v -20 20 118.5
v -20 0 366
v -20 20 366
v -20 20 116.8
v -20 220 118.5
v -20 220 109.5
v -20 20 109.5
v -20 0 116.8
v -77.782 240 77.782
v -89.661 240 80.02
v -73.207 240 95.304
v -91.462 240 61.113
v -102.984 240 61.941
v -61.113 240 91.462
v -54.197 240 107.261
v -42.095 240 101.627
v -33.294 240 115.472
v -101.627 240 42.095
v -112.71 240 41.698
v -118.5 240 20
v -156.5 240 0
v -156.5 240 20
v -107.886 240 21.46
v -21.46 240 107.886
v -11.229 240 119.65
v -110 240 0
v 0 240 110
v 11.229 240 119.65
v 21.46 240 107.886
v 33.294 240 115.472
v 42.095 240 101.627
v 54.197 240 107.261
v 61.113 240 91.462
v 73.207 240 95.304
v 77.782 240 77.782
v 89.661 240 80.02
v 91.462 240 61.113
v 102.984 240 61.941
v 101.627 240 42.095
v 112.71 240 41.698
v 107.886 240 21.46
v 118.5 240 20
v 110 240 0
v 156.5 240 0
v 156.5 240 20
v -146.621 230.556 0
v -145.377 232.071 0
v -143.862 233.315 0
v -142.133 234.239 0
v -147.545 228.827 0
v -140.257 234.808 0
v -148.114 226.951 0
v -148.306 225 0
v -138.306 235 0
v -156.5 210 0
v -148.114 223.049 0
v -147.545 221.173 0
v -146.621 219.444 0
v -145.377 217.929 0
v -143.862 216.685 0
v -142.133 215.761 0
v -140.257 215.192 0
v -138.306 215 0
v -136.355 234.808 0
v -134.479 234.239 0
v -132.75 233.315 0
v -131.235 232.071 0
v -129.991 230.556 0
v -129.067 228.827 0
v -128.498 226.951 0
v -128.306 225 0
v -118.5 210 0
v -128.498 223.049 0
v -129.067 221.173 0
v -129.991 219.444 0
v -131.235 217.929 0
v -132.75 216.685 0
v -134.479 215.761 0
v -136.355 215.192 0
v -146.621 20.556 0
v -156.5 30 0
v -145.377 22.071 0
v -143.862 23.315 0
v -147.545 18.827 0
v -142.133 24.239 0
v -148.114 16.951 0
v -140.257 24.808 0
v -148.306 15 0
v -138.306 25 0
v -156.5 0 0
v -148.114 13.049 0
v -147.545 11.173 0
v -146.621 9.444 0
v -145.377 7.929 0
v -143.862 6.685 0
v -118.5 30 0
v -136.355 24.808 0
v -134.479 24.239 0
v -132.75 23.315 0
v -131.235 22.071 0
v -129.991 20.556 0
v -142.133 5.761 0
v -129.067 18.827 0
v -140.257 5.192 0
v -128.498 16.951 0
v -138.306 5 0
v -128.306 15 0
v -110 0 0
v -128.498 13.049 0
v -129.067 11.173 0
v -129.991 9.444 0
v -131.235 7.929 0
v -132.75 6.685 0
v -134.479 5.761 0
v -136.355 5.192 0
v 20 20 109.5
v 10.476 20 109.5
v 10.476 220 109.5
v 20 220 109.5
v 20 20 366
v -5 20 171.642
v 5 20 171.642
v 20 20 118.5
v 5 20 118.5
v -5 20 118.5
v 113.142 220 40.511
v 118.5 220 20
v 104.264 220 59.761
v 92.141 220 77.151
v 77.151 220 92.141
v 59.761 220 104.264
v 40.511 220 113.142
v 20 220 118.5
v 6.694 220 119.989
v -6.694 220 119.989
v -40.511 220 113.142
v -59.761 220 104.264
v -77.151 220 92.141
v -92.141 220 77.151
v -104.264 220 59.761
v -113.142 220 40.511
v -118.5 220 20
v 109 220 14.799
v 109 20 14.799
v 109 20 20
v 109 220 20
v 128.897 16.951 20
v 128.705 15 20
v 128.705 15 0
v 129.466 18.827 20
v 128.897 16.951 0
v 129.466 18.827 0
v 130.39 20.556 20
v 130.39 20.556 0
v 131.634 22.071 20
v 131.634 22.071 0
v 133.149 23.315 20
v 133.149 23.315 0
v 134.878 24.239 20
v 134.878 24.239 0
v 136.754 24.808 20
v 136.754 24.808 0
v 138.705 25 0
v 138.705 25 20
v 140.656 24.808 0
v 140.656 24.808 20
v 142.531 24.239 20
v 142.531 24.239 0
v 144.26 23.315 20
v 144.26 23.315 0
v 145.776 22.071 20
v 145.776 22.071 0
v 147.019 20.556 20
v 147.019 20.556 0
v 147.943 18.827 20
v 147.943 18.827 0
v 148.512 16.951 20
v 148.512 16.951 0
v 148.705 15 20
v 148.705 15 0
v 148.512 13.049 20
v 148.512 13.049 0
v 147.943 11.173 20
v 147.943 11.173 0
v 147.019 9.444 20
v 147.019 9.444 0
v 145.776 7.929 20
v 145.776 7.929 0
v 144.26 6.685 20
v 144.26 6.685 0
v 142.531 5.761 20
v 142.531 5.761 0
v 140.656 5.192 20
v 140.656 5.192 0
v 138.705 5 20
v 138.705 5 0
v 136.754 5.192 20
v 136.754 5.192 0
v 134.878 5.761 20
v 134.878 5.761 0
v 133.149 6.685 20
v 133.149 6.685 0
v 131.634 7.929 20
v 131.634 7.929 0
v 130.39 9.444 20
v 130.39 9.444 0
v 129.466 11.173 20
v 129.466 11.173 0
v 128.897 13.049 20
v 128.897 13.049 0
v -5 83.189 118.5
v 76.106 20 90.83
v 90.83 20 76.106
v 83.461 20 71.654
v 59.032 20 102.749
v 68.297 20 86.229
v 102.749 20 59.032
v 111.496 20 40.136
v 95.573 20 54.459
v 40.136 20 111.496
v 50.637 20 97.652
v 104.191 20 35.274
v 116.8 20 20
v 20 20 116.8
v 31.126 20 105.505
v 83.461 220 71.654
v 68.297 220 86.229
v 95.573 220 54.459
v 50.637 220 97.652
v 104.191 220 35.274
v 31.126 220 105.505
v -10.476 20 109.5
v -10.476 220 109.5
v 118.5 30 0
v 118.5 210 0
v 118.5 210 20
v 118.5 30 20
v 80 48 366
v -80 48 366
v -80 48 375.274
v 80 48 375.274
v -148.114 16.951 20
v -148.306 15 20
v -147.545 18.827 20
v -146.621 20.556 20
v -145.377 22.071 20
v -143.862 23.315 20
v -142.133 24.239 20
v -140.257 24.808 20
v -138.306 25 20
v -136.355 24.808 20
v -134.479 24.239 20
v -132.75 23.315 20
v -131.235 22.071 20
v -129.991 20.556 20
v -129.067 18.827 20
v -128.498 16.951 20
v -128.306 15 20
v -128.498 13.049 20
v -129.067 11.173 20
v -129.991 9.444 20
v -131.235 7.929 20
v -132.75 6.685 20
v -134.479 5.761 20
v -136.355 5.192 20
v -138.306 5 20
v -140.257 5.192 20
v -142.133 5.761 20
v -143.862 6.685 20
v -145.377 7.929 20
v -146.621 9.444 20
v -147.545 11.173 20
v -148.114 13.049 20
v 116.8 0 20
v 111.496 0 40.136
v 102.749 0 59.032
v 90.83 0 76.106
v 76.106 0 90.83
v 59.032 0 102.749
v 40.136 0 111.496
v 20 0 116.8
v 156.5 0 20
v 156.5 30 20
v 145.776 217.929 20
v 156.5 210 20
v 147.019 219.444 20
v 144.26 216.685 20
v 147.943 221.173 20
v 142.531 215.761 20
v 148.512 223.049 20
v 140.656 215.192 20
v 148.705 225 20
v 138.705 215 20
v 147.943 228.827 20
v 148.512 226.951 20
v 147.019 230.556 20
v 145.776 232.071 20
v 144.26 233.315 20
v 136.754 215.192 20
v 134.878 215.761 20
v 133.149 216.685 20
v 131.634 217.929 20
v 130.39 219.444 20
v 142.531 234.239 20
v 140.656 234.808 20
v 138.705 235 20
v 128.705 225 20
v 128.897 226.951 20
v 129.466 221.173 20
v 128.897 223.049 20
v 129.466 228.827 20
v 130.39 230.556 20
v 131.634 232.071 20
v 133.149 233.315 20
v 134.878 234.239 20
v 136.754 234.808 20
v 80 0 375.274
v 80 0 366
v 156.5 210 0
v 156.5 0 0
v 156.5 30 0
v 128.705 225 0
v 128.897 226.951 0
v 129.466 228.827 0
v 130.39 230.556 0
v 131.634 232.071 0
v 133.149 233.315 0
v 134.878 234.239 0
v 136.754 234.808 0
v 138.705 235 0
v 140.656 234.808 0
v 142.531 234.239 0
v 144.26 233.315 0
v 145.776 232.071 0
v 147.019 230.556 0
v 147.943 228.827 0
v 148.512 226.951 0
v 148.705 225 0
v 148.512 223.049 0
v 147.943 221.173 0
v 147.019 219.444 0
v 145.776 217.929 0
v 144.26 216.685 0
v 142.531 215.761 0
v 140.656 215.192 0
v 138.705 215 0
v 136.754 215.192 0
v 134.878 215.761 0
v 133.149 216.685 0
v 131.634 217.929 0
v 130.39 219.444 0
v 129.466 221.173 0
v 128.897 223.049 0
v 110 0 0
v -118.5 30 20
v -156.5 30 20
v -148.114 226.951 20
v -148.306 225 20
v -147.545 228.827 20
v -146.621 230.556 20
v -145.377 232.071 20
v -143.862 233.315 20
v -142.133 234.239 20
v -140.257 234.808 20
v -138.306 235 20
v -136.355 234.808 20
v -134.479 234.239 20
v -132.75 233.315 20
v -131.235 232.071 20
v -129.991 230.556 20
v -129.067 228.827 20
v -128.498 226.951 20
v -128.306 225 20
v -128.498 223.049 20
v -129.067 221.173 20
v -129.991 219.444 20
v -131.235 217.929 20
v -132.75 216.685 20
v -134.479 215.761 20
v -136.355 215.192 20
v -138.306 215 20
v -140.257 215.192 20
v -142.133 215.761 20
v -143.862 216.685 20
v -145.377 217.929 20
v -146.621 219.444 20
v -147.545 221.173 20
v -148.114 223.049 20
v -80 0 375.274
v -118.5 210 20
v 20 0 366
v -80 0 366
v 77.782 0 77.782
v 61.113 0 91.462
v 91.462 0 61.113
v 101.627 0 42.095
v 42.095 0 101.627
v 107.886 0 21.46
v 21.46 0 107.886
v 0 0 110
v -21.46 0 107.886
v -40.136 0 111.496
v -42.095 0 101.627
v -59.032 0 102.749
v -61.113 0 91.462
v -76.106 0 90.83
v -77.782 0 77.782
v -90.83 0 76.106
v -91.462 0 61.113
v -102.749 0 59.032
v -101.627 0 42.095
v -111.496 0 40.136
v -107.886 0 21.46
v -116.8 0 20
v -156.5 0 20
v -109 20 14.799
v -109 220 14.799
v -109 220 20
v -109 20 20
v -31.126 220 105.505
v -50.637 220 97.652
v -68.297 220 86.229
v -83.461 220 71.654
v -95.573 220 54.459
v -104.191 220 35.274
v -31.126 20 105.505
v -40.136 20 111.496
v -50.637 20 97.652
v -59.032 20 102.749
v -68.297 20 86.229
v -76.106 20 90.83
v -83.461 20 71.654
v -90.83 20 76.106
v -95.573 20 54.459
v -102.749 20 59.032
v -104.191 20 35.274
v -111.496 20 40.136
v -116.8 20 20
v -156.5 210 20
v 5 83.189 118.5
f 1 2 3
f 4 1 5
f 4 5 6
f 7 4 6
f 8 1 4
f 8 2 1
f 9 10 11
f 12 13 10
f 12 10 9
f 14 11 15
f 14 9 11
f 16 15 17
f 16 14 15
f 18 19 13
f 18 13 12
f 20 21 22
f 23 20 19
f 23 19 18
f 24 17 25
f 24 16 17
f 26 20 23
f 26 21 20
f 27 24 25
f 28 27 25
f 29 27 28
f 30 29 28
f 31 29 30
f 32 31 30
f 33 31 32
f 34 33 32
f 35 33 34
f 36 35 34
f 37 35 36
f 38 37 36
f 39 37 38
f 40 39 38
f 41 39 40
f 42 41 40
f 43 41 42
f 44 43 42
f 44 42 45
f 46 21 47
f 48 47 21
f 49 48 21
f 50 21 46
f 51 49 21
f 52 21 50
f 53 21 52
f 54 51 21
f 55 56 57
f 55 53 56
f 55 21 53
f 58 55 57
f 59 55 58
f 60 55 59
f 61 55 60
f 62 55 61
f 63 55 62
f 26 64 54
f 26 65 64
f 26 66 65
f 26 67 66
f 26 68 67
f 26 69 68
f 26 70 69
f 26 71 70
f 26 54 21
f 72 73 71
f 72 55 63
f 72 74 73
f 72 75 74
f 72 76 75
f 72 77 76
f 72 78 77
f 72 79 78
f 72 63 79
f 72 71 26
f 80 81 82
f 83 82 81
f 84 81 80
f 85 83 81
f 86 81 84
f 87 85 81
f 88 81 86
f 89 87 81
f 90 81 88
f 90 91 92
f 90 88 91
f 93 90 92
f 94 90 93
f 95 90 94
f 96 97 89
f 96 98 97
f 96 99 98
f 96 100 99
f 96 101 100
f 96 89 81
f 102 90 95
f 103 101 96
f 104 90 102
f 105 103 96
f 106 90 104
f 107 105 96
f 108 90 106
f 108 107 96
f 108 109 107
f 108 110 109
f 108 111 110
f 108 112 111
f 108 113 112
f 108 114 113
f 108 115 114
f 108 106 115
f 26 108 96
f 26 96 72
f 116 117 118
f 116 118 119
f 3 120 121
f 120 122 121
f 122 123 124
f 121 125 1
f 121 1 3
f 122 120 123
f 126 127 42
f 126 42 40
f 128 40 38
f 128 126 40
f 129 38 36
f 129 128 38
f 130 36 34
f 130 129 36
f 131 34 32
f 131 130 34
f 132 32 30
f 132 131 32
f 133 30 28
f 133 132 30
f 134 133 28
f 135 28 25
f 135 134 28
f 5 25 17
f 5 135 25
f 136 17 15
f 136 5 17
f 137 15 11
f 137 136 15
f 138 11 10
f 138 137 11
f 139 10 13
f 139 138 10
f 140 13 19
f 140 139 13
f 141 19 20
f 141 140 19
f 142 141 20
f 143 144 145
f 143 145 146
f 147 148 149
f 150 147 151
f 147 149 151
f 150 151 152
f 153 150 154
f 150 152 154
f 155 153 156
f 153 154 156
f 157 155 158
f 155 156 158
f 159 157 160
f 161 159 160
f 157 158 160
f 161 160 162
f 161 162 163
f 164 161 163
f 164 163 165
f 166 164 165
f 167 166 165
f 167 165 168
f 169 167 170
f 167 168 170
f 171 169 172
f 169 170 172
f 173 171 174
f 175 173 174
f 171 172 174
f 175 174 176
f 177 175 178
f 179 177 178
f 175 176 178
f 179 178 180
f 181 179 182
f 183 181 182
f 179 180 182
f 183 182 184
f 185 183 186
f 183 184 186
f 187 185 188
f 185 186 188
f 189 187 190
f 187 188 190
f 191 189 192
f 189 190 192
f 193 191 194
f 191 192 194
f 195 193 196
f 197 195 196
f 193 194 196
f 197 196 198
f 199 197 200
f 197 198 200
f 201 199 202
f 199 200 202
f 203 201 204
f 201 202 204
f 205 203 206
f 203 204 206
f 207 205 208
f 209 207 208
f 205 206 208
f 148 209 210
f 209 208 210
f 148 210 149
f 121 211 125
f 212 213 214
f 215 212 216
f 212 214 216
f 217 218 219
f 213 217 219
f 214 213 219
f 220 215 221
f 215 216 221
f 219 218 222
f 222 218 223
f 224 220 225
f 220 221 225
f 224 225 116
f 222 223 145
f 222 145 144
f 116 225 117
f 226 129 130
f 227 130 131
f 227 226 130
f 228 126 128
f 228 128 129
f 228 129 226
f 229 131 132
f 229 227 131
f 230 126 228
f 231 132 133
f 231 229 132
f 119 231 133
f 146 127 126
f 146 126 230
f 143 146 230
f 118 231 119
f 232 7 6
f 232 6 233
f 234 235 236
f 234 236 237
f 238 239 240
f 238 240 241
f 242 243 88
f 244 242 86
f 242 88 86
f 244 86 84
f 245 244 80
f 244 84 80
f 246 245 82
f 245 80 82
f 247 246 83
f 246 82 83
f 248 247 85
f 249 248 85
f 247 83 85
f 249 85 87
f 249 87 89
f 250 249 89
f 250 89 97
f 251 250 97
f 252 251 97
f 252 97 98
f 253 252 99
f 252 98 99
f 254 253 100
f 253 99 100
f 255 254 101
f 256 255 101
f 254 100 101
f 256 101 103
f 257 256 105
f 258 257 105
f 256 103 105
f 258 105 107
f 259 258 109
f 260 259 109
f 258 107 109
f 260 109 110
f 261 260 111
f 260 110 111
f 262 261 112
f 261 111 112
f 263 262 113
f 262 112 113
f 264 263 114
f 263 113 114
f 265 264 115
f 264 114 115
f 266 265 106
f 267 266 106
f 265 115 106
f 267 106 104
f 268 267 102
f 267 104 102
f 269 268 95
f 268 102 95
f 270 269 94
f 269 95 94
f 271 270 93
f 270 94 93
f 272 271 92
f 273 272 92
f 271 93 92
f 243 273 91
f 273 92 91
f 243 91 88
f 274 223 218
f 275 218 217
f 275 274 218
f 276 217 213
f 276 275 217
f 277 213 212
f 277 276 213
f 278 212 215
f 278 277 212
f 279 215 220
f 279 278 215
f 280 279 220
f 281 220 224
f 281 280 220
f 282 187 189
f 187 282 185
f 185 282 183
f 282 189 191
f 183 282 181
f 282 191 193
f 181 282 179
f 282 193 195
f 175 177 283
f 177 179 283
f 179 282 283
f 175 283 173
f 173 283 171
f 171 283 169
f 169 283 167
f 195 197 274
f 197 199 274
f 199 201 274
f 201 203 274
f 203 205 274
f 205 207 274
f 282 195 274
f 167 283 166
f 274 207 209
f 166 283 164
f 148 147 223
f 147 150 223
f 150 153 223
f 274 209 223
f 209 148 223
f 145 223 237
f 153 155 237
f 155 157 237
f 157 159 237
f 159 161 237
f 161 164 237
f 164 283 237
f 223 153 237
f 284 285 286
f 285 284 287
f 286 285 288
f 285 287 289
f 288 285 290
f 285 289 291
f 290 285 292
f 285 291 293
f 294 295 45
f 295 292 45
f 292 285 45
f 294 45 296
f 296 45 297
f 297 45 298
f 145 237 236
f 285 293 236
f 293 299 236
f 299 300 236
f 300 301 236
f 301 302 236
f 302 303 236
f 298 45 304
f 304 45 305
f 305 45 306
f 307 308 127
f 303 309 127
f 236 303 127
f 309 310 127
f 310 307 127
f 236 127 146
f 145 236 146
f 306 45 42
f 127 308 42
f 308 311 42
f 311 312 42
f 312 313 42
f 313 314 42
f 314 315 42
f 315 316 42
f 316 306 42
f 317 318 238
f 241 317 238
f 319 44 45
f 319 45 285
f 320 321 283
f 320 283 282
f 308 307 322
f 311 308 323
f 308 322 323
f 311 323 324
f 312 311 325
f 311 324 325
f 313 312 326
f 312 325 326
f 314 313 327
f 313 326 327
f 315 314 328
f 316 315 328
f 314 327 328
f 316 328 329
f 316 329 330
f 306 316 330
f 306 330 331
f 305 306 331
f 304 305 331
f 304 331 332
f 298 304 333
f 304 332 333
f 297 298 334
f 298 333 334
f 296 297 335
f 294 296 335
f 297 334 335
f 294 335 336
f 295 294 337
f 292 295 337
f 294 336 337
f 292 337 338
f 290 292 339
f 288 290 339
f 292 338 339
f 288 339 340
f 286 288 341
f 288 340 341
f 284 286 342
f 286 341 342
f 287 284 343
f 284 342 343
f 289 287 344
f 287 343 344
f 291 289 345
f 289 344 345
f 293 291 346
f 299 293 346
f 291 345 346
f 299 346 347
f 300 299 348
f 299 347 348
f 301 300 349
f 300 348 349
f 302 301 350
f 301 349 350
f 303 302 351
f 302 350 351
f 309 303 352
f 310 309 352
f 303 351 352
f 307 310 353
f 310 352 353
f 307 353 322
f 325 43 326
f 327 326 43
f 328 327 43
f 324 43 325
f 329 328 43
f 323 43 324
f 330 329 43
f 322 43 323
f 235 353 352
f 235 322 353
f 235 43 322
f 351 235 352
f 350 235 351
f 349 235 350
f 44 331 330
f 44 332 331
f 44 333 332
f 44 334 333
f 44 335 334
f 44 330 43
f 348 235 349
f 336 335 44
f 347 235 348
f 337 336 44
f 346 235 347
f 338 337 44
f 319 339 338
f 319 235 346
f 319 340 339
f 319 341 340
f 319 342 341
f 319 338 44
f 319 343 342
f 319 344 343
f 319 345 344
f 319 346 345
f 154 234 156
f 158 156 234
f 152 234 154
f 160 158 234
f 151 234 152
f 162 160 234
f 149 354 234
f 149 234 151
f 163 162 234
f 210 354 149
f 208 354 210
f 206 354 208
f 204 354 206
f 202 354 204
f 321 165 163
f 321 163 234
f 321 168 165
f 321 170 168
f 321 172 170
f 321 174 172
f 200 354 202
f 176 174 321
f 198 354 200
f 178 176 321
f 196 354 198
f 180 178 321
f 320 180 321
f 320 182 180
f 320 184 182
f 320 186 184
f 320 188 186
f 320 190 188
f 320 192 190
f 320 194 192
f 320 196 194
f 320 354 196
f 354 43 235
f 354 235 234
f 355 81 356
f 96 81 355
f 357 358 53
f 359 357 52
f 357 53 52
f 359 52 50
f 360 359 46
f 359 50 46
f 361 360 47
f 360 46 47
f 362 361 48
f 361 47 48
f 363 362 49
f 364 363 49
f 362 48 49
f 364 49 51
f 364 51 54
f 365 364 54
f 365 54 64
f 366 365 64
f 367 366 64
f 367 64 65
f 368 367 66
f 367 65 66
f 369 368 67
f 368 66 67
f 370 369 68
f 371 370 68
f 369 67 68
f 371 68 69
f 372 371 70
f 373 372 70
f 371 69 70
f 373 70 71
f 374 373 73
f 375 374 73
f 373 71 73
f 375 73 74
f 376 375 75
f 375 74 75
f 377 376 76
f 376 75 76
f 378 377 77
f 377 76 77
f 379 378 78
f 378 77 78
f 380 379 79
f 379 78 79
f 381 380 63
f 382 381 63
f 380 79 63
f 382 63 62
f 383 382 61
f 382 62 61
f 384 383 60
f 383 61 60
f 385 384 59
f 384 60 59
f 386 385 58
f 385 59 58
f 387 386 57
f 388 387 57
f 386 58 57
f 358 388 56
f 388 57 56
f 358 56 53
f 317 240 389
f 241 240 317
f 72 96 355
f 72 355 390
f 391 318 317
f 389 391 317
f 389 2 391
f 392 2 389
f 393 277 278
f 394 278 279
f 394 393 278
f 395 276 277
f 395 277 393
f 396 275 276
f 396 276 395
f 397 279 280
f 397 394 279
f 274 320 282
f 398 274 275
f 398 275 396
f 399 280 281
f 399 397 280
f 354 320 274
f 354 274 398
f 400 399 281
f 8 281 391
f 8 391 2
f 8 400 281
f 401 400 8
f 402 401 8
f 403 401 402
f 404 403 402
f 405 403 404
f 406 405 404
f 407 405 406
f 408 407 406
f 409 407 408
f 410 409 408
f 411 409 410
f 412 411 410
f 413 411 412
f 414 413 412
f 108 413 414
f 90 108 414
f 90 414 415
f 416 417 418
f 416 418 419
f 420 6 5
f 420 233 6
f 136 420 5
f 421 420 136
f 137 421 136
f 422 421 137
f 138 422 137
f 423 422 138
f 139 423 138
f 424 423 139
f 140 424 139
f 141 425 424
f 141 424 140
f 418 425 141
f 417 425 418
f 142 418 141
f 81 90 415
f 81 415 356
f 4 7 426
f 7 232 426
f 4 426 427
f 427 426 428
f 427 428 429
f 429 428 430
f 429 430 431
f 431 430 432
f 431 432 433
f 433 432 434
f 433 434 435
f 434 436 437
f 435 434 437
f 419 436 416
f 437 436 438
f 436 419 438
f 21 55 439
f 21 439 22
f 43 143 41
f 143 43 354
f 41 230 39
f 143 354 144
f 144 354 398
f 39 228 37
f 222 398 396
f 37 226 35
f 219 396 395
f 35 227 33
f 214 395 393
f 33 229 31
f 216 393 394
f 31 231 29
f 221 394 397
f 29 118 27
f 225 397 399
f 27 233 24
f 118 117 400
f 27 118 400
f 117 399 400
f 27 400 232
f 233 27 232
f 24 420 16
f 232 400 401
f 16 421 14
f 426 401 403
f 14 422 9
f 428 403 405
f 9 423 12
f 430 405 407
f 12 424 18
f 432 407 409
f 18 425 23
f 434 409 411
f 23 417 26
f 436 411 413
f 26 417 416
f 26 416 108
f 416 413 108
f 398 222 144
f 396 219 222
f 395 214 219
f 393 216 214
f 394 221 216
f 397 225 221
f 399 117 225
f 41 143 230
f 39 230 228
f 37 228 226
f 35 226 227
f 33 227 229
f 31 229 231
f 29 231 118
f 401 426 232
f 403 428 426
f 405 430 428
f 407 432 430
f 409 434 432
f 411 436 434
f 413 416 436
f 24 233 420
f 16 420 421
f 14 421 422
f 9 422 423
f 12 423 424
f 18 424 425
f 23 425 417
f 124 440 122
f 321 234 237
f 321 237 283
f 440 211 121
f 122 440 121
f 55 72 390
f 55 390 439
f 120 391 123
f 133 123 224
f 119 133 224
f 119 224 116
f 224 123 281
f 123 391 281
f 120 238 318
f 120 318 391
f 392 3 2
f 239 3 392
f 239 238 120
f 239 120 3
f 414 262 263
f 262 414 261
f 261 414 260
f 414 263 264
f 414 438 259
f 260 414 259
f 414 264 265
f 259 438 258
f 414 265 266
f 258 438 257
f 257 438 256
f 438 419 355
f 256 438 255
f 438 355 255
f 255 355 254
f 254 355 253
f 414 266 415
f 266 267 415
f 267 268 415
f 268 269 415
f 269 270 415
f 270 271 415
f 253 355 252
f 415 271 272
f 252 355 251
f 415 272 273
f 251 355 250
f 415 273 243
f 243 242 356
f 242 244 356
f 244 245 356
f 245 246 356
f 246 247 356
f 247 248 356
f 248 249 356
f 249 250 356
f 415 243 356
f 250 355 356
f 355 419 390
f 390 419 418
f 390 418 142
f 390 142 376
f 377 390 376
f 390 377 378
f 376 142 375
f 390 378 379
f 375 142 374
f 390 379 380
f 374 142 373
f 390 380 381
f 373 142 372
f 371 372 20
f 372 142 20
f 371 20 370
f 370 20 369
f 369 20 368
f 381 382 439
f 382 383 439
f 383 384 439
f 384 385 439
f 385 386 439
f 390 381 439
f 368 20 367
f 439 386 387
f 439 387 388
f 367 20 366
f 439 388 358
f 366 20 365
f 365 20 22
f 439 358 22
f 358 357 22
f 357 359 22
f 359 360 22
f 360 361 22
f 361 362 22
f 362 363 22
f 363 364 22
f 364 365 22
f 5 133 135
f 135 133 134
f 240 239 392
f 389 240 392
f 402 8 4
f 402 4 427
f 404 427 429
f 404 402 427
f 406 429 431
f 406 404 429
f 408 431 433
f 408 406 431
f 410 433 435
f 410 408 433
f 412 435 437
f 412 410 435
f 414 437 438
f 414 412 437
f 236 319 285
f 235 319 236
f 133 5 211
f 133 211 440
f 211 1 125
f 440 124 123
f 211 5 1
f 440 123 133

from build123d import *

# Parameters (mm, degrees)
EXTRUDE_1_DEPTH      = 20
EXTRUDE_2_REACH      = 387.225
EXTRUDE_2_END_RADIUS = 118.5
SKETCH_4_W           = 40
SKETCH_4_H           = 9
EXTRUDE_3_DEPTH      = 200
EXTRUDE_5_DEPTH      = 20
RIB_6_REACH          = 455.87
SKETCH_10_WALL_W     = 992.30498819
SKETCH_10_WALL_H     = 10
EXTRUDE_6_DEPTH      = 10
EXTRUDE_7_DEPTH      = 20
SKETCH_13_R          = 10
CUT_EXTRUDE_1_DEPTH  = 20
CUT_EXTRUDE_2_DEPTH  = 240
CUT_EXTRUDE_3_REACH  = 452.258
SKETCH_15_W          = 160
SKETCH_15_H          = 0.725633759


with BuildPart() as part:
    # 草图1 → 凸台-拉伸1 (new body)
    with BuildSketch(Plane(origin=(0, 0, 0), x_dir=(1, 0, 0), z_dir=(0, 1, 0))):
        with BuildLine():
            Line((-118.5, 0), (-108.5, 0))
            ThreePointArc((-108.5, 0), (0, -108.5), (108.5, 0))
            Line((108.5, 0), (118.5, 0))
            ThreePointArc((118.5, 0), (0, -118.5), (-118.5, 0))
        make_face()
    extrude(amount=EXTRUDE_1_DEPTH)

    # 凸台-拉伸2: up to this cylinder (the profile starts outside it)
    extrude_2_end = Plane(origin=(0, 10, 0), z_dir=(0, -1, 0)) * Cylinder(EXTRUDE_2_END_RADIUS, 1012.45, mode=Mode.PRIVATE)
    # 草图3 → 凸台-拉伸2 (add, up to the surface)
    with BuildSketch(Plane.XY.offset(366), mode=Mode.PRIVATE) as extrude_2_sk1:
        Polygon((0, 0), (20, 0), (20, 20), (-20, 20), (-20, 0), align=None)
    extrude_2_tool1 = extrude(extrude_2_sk1.sketch, amount=-EXTRUDE_2_REACH, mode=Mode.PRIVATE) - extrude_2_end
    add(extrude_2_tool1.solids().sort_by_distance((0, 10, 366))[0])

    # 草图4 → 凸台-拉伸3 (add)
    with BuildSketch(Plane(origin=(0, 20, 0), x_dir=(1, 0, 0), z_dir=(0, 1, 0))):
        with Locations((0, -114)):
            Rectangle(SKETCH_4_W, SKETCH_4_H)
    extrude(amount=EXTRUDE_3_DEPTH)

    # 草图5 → 凸台-拉伸5 (add)
    with BuildSketch(Plane(origin=(0, 220, 0), x_dir=(1, 0, 0), z_dir=(0, 1, 0))):
        with BuildLine():
            Line((-120.175912728, 0), (-108.5, 0))
            ThreePointArc((-108.5, 0), (0, -108.5), (108.5, 0))
            Line((108.5, 0), (120.175912728, 0))
            ThreePointArc((120.175912728, 0), (0, -120.175912728), (-120.175912728, 0))
        make_face()
    extrude(amount=EXTRUDE_5_DEPTH)

    # 草图10 wall → 筋6 (add, up to next)
    with BuildSketch(Plane(origin=(0, 51.594277654, 145.071057526), x_dir=(0, -0.765324590967, 0.643644521814), z_dir=(0, -0.643644521814, -0.765324590967)), mode=Mode.PRIVATE) as rib_6_sk1:
        Rectangle(SKETCH_10_WALL_W, SKETCH_10_WALL_H)
    rib_6_tool1 = extrude(rib_6_sk1.sketch, amount=RIB_6_REACH, mode=Mode.PRIVATE) - part.part
    add(rib_6_tool1.solids().sort_by_distance((0, 51.594277654, 145.071057526))[0])

    # 草图11 → 凸台-拉伸6 (add)
    with BuildSketch(Plane.XY.offset(366)):
        Polygon((-80, 48), (80, 48), (80, 38), (80, 20), (80, 0), (-80, 0), (-80, 20), (-80, 38), align=None)
    extrude(amount=EXTRUDE_6_DEPTH)

    # 草图12 → 凸台-拉伸7 (add)
    with BuildSketch(Plane.XY):
        Polygon((-109, 0), (-156.5, 0), (-156.5, 30), (-118.5, 30), (-118.5, 210), (-156.5, 210), (-156.5, 240), (-109, 240), align=None)
        Polygon((156.5, 0), (109, 0), (109, 240), (156.5, 240), (156.5, 210), (118.5, 210), (118.5, 30), (156.5, 30), align=None)
    extrude(amount=EXTRUDE_7_DEPTH)

    # 草图13 → 切除-拉伸1 (cut)
    with BuildSketch(Plane(origin=(0, 0, 0), x_dir=(-1, 0, 0), z_dir=(0, 0, -1))):
        with Locations((138.306064525, 225)):
            Circle(SKETCH_13_R)
        with Locations((138.306064525, 15)):
            Circle(SKETCH_13_R)
        with Locations((-138.70464108, 225)):
            Circle(SKETCH_13_R)
        with Locations((-138.70464108, 15)):
            Circle(SKETCH_13_R)
    extrude(amount=-CUT_EXTRUDE_1_DEPTH, mode=Mode.SUBTRACT)

    # 草图14 → 切除-拉伸2 (cut)
    with BuildSketch(Plane(origin=(0, 0, 0), x_dir=(1, 0, 0), z_dir=(0, 1, 0))):
        with BuildLine():
            Line((-110, 0), (110, 0))
            ThreePointArc((110, 0), (0, -110), (-110, 0))
        make_face()
    extrude(amount=CUT_EXTRUDE_2_DEPTH, mode=Mode.SUBTRACT)

    # 草图15 → 切除-拉伸3 (cut, up to next)
    with BuildSketch(Plane(origin=(0, 48, 0), x_dir=(1, 0, 0), z_dir=(0, 1, 0)), mode=Mode.PRIVATE) as cut_extrude_3_sk1:
        with Locations((0, -375.637183121)):
            Rectangle(SKETCH_15_W, SKETCH_15_H)
    cut_extrude_3_tool1 = extrude(cut_extrude_3_sk1.sketch, amount=-CUT_EXTRUDE_3_REACH, mode=Mode.PRIVATE) & part.part
    add(cut_extrude_3_tool1.solids().sort_by_distance((0, 48, 375.637183))[0], mode=Mode.SUBTRACT)


solid = part.part
